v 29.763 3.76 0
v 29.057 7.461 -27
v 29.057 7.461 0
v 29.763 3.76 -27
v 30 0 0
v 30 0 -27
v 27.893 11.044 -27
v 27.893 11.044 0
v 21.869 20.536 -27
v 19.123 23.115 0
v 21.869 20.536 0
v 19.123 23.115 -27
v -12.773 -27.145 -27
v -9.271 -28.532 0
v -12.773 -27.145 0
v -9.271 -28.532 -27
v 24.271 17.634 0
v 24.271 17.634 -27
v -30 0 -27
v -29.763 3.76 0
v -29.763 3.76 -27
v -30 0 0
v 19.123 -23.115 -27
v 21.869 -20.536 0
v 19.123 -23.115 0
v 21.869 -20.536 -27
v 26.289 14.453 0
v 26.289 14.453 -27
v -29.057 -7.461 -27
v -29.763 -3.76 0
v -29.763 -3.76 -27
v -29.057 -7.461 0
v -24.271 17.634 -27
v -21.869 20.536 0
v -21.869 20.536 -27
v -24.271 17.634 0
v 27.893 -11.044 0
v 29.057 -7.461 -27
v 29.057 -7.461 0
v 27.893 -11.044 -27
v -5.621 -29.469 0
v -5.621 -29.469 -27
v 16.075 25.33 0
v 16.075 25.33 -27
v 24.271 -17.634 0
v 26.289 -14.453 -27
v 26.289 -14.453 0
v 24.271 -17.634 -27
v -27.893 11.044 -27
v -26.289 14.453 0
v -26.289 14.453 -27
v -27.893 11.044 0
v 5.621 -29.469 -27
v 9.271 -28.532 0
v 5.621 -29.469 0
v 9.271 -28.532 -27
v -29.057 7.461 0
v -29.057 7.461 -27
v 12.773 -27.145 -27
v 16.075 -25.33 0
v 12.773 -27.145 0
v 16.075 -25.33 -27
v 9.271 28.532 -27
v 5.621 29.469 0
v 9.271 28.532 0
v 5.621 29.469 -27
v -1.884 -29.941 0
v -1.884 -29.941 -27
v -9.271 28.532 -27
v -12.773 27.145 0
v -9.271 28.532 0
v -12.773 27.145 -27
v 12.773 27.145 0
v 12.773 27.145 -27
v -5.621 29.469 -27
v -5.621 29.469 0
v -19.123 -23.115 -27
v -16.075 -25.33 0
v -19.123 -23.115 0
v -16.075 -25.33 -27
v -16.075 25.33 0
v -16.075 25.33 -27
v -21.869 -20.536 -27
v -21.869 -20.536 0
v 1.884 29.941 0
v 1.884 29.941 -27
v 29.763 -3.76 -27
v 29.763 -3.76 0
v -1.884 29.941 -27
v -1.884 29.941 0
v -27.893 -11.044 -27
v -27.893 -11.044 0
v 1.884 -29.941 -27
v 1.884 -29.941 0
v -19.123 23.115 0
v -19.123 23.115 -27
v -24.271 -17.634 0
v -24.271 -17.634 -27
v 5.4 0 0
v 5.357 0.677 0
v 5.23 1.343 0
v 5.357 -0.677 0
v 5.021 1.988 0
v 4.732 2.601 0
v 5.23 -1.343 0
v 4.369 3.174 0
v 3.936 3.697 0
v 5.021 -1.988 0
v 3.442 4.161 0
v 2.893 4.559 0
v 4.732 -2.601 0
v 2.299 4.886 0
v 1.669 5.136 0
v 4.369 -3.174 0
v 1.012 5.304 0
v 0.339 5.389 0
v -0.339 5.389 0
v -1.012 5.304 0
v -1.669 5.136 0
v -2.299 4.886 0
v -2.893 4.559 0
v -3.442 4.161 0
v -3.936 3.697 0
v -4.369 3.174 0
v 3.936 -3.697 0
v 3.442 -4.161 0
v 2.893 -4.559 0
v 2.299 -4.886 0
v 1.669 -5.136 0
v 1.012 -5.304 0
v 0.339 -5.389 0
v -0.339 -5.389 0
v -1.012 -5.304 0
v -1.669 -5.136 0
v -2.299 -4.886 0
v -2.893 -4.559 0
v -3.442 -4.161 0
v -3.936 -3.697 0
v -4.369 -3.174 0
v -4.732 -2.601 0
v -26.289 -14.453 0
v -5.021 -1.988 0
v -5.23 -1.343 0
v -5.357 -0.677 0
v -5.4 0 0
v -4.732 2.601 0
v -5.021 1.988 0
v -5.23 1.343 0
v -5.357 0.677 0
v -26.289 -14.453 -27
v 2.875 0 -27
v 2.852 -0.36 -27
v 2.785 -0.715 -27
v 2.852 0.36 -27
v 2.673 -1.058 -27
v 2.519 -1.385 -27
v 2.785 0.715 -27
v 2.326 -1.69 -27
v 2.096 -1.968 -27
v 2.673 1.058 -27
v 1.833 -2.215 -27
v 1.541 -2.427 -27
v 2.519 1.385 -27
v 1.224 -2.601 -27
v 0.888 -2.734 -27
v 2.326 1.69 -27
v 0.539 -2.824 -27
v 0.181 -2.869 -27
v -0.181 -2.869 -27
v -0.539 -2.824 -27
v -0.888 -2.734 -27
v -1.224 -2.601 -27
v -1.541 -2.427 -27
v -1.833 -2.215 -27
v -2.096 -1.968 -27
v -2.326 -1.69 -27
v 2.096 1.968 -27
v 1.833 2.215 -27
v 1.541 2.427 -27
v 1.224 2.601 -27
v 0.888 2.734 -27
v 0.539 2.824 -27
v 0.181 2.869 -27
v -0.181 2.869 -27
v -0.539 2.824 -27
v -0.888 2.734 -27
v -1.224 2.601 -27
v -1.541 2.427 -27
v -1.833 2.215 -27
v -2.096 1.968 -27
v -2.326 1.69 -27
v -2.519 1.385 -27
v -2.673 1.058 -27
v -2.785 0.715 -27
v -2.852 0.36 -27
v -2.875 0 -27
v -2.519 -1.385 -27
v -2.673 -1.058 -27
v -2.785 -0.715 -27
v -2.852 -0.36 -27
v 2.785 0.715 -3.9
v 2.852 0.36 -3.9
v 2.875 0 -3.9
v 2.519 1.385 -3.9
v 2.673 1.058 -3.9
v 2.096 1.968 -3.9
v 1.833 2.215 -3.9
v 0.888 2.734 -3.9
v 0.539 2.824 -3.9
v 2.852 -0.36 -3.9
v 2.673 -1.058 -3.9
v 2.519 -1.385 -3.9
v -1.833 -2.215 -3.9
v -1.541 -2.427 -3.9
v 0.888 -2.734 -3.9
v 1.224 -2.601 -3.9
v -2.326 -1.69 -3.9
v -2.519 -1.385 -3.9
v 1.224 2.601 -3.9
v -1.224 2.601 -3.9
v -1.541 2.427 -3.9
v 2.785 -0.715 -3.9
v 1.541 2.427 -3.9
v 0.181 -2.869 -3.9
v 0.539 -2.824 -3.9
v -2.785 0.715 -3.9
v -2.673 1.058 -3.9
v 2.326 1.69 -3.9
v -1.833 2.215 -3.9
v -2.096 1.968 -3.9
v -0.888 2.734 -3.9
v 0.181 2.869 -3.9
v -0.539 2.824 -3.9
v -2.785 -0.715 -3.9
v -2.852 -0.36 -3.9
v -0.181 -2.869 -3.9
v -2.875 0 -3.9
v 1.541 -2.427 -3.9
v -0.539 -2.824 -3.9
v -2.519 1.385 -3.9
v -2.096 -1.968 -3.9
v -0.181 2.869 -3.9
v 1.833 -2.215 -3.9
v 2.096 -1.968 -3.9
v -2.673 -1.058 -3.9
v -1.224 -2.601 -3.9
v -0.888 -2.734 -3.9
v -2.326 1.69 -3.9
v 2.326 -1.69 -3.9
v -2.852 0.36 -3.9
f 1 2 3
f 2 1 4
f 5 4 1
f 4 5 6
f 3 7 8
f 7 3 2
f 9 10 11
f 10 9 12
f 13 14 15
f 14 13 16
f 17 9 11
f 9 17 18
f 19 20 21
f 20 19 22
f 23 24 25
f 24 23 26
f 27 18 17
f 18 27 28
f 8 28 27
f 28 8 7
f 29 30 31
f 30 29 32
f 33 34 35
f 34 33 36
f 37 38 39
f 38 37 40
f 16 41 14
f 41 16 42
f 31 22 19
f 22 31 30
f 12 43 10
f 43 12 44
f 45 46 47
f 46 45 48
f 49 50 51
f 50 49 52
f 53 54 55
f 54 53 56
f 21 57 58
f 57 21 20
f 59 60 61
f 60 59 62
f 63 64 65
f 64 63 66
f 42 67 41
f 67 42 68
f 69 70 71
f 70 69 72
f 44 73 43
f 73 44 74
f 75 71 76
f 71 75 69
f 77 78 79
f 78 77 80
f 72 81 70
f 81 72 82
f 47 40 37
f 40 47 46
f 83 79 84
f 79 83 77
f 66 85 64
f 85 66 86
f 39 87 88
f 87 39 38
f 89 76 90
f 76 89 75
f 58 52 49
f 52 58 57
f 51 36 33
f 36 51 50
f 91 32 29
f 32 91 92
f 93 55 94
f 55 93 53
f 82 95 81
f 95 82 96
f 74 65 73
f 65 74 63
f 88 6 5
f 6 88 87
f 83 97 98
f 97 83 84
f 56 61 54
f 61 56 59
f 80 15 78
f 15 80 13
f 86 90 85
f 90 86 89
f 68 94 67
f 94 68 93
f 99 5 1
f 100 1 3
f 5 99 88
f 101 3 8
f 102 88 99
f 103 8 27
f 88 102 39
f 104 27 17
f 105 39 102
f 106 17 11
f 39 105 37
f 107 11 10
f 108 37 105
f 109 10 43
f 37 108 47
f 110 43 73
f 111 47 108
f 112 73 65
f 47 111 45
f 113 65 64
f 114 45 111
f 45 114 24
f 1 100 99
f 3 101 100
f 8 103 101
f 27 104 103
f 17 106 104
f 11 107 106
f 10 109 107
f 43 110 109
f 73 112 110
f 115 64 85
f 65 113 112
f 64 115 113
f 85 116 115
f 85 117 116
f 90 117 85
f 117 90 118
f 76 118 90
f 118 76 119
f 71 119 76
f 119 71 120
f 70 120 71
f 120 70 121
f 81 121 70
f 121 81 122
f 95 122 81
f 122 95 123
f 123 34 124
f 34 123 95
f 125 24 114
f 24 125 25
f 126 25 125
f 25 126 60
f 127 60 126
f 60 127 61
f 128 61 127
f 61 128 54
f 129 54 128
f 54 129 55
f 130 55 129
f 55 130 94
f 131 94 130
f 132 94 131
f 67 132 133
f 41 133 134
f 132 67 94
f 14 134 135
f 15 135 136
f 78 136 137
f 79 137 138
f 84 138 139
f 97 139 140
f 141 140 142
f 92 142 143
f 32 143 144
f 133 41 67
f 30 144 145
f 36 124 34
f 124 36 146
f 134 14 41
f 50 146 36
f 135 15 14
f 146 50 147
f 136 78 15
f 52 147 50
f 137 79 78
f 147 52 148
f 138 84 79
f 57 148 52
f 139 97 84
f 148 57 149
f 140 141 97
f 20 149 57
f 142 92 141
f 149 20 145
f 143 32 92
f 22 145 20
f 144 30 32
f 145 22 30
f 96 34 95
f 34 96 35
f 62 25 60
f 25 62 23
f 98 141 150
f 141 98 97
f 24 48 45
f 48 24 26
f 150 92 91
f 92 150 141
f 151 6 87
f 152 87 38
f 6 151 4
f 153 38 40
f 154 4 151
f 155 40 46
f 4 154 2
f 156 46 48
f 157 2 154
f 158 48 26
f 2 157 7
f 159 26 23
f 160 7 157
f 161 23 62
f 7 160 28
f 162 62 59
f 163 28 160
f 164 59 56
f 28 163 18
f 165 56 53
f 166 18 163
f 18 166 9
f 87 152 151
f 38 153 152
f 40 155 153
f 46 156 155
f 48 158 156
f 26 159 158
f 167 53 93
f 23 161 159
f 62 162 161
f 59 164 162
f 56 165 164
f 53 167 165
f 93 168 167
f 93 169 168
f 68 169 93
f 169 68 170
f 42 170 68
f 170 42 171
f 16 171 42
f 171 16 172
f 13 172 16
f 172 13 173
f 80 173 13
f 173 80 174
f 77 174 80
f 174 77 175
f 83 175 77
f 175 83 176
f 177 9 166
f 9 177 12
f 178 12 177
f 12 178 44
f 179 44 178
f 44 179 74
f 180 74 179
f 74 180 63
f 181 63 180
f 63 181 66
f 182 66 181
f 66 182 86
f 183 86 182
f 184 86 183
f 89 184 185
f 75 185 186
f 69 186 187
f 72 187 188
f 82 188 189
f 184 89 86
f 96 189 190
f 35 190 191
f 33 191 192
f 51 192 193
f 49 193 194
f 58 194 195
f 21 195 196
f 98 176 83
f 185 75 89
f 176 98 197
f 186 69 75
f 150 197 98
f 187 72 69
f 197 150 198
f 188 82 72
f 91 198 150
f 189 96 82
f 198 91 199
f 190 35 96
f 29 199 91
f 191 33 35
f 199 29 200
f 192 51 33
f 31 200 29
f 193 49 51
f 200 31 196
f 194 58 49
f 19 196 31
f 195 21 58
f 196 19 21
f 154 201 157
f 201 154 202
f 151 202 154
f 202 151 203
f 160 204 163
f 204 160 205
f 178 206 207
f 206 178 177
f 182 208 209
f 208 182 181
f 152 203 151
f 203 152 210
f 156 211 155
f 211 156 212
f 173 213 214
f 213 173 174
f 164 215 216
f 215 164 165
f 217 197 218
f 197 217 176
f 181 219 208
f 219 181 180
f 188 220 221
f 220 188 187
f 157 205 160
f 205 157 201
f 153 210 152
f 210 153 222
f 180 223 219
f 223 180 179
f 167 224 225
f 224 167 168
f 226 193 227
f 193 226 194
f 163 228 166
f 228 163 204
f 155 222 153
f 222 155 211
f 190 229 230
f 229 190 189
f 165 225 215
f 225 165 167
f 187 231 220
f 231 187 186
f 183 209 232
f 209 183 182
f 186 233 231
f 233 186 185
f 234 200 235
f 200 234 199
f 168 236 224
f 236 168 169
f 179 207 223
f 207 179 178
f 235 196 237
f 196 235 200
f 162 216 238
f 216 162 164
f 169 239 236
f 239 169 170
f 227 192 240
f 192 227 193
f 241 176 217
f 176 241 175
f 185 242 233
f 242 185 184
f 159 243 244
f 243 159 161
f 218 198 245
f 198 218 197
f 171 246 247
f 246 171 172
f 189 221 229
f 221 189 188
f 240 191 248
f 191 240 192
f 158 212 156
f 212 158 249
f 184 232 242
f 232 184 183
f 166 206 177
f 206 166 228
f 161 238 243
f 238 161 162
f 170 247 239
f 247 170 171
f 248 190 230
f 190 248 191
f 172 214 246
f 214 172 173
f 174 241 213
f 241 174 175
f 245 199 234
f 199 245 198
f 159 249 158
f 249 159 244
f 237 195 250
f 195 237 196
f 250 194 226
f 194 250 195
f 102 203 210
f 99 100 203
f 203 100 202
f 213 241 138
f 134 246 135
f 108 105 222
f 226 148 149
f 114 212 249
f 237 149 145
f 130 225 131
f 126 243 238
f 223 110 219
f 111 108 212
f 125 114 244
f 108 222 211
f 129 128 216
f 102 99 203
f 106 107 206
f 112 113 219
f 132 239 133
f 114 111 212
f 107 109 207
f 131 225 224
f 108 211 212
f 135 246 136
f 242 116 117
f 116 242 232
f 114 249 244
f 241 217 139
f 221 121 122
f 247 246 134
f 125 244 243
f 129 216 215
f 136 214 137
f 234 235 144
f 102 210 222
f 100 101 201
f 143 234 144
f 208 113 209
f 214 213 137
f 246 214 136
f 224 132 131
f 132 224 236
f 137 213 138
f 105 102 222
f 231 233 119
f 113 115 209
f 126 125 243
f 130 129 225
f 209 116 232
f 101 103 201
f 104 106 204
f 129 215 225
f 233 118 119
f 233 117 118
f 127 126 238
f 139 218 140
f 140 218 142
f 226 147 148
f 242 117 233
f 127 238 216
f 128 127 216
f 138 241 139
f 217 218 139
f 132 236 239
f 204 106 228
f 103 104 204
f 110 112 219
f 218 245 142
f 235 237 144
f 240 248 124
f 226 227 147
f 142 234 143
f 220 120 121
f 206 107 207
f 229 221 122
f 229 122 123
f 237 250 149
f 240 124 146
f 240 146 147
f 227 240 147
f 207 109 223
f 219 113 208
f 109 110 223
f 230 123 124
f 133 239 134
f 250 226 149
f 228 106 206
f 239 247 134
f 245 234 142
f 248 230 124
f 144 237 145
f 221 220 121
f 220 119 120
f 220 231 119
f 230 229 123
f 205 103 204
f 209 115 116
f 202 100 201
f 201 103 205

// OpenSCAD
$fn = 50;


difference() {
	union() {
		translate(v = [0, 0, -27.0000000000]) {
			cylinder(h = 27, r = 30.0000000000);
		}
		#translate(v = [0, 0, -30.0000000000]) {
			cylinder(h = 30, r = 2.8750000000);
		}
	}
	union() {
		translate(v = [0, 0, 0]) {
			rotate(a = [0, 0, 0]) {
				difference() {
					union() {
						translate(v = [0, 0, -30.0000000000]) {
							cylinder(h = 30, r = 2.6000000000);
						}
						translate(v = [0, 0, -3.9000000000]) {
							cylinder(h = 3.9000000000, r1 = 2.8750000000, r2 = 5.4000000000);
						}
						translate(v = [0, 0, -30.0000000000]) {
							cylinder(h = 30, r = 2.8750000000);
						}
						translate(v = [0, 0, -30.0000000000]) {
							cylinder(h = 30, r = 2.6000000000);
						}
					}
					union();
				}
			}
		}
	}
}
